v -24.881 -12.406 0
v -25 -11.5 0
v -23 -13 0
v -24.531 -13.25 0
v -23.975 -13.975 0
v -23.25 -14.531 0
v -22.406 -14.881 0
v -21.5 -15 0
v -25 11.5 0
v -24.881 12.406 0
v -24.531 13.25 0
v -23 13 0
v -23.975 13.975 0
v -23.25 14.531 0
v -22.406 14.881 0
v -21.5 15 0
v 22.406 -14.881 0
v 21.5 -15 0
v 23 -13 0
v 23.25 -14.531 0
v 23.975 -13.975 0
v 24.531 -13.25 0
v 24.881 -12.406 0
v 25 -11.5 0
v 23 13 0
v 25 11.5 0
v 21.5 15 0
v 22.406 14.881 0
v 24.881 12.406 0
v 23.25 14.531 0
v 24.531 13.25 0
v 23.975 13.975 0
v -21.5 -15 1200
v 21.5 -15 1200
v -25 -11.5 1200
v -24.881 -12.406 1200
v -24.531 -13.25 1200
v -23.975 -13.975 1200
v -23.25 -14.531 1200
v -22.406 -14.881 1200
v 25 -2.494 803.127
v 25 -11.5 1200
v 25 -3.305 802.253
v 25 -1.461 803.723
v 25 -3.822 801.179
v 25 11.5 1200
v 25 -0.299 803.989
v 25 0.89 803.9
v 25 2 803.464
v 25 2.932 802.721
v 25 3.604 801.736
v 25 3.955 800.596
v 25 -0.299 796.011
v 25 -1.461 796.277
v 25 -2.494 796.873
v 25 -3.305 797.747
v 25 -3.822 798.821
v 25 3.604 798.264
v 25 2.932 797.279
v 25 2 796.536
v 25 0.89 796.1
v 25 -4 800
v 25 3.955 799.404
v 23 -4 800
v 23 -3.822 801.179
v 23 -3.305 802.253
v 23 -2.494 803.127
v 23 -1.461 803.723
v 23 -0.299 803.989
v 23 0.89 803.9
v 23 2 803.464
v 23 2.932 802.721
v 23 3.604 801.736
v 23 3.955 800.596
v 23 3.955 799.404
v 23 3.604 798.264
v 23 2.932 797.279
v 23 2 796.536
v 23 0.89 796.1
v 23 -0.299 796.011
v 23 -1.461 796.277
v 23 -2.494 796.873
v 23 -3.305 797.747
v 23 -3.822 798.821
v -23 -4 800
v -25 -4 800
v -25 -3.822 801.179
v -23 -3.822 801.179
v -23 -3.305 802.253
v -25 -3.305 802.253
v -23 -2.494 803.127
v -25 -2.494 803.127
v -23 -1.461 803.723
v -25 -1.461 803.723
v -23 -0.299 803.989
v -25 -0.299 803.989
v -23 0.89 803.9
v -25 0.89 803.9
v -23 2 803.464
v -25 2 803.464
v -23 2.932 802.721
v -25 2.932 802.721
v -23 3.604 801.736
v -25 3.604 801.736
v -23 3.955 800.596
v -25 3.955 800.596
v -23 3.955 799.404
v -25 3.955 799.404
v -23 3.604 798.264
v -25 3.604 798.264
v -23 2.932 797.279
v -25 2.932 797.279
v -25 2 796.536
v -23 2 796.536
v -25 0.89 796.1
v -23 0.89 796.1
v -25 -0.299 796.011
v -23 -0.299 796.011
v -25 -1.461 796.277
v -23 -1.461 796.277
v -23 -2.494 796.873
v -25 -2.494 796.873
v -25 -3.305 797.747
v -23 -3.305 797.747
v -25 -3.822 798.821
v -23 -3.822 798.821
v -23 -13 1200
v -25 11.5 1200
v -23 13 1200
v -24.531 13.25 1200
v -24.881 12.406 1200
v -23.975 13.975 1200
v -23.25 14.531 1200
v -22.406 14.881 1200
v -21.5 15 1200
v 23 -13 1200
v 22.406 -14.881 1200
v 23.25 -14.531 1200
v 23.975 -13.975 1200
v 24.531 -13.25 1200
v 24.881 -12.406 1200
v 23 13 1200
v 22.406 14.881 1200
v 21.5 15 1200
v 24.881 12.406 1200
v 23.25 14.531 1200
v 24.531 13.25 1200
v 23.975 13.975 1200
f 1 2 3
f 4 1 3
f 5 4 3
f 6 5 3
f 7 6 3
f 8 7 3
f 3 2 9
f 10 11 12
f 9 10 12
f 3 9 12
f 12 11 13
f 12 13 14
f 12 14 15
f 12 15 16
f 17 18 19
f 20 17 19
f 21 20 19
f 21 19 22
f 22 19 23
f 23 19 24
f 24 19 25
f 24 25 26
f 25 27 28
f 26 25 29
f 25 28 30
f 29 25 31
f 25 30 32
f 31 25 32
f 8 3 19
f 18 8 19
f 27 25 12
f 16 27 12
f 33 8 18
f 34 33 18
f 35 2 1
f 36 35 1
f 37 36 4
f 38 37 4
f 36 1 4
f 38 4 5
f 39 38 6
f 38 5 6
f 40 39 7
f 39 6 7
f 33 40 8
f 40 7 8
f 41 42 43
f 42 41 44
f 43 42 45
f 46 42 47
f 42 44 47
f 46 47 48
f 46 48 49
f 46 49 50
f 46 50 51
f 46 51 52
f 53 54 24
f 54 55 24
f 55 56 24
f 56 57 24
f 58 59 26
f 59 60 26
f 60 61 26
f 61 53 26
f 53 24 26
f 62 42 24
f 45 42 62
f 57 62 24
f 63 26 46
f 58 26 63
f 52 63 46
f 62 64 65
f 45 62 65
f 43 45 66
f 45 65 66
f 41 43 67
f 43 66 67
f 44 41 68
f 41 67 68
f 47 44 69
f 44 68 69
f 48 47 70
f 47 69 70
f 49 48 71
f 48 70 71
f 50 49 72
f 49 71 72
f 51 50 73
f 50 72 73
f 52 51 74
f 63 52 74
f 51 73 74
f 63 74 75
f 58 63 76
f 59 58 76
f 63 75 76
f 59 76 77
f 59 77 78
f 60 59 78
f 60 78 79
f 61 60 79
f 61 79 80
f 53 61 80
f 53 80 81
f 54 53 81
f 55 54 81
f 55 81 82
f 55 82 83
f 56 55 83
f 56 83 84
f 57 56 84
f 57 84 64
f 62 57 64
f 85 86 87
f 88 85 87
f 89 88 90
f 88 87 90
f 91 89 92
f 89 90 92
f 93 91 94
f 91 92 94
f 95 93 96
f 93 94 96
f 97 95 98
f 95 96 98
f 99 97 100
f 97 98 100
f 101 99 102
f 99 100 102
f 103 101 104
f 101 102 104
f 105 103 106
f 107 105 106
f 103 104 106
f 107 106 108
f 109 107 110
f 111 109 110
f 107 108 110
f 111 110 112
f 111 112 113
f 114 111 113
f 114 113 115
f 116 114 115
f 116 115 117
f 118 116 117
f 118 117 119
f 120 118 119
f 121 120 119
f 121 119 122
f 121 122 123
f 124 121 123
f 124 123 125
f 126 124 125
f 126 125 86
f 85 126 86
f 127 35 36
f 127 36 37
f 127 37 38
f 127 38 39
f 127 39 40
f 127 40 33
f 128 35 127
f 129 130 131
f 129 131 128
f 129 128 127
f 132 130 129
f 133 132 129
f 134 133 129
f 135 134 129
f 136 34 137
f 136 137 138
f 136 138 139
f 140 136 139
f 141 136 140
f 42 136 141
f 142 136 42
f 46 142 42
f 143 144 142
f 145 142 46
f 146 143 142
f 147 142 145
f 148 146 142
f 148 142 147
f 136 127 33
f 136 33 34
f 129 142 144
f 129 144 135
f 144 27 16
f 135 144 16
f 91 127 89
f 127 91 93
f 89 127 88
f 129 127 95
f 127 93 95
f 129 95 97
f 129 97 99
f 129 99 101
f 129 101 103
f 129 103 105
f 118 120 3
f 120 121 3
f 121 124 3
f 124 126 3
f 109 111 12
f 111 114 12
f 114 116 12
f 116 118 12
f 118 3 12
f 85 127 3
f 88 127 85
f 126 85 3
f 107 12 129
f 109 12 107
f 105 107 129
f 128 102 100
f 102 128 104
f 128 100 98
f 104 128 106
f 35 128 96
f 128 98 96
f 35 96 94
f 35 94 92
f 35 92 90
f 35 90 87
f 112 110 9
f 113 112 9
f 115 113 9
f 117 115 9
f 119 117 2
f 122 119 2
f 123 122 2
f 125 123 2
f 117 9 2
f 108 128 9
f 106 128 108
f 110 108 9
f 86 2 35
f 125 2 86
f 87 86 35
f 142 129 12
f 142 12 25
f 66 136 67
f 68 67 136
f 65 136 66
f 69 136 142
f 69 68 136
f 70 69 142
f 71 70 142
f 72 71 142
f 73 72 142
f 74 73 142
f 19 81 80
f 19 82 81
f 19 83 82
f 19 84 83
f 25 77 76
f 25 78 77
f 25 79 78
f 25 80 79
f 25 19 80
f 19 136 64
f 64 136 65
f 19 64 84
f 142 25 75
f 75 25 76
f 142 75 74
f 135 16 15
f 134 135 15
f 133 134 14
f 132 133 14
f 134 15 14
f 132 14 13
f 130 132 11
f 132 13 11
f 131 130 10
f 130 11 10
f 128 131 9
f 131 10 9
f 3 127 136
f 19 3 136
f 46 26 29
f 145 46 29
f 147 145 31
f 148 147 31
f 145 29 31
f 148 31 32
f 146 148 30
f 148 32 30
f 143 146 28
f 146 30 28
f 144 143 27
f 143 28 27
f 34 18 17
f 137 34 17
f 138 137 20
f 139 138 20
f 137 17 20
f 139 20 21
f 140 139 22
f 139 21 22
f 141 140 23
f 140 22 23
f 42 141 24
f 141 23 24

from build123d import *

# Parameters (mm, degrees)
F0_W     = 46
F0_H     = 26
F1_DEPTH = 1200
F3_D     = 8


with BuildPart() as f1:
    # F0 (on Top) → F1 (new body)
    with BuildSketch(Plane.XY):
        with BuildLine():
            ThreePointArc((25, 11.5), (23.974874, 13.974874), (21.5, 15))
            Line((21.5, 15), (-21.5, 15))
            ThreePointArc((-21.5, 15), (-23.974874, 13.974874), (-25, 11.5))
            Line((-25, 11.5), (-25, -11.5))
            ThreePointArc((-25, -11.5), (-23.974874, -13.974874), (-21.5, -15))
            Line((-21.5, -15), (21.5, -15))
            ThreePointArc((21.5, -15), (23.974874, -13.974874), (25, -11.5))
            Line((25, -11.5), (25, 11.5))
        make_face()
        Rectangle(F0_W, F0_H, mode=Mode.SUBTRACT)
    extrude(amount=F1_DEPTH)

    # F3 (through all)
    with Locations(Plane.YZ.offset(25)):
        with Locations((0, 800)):
            Hole(F3_D / 2)


solid = f1.part
